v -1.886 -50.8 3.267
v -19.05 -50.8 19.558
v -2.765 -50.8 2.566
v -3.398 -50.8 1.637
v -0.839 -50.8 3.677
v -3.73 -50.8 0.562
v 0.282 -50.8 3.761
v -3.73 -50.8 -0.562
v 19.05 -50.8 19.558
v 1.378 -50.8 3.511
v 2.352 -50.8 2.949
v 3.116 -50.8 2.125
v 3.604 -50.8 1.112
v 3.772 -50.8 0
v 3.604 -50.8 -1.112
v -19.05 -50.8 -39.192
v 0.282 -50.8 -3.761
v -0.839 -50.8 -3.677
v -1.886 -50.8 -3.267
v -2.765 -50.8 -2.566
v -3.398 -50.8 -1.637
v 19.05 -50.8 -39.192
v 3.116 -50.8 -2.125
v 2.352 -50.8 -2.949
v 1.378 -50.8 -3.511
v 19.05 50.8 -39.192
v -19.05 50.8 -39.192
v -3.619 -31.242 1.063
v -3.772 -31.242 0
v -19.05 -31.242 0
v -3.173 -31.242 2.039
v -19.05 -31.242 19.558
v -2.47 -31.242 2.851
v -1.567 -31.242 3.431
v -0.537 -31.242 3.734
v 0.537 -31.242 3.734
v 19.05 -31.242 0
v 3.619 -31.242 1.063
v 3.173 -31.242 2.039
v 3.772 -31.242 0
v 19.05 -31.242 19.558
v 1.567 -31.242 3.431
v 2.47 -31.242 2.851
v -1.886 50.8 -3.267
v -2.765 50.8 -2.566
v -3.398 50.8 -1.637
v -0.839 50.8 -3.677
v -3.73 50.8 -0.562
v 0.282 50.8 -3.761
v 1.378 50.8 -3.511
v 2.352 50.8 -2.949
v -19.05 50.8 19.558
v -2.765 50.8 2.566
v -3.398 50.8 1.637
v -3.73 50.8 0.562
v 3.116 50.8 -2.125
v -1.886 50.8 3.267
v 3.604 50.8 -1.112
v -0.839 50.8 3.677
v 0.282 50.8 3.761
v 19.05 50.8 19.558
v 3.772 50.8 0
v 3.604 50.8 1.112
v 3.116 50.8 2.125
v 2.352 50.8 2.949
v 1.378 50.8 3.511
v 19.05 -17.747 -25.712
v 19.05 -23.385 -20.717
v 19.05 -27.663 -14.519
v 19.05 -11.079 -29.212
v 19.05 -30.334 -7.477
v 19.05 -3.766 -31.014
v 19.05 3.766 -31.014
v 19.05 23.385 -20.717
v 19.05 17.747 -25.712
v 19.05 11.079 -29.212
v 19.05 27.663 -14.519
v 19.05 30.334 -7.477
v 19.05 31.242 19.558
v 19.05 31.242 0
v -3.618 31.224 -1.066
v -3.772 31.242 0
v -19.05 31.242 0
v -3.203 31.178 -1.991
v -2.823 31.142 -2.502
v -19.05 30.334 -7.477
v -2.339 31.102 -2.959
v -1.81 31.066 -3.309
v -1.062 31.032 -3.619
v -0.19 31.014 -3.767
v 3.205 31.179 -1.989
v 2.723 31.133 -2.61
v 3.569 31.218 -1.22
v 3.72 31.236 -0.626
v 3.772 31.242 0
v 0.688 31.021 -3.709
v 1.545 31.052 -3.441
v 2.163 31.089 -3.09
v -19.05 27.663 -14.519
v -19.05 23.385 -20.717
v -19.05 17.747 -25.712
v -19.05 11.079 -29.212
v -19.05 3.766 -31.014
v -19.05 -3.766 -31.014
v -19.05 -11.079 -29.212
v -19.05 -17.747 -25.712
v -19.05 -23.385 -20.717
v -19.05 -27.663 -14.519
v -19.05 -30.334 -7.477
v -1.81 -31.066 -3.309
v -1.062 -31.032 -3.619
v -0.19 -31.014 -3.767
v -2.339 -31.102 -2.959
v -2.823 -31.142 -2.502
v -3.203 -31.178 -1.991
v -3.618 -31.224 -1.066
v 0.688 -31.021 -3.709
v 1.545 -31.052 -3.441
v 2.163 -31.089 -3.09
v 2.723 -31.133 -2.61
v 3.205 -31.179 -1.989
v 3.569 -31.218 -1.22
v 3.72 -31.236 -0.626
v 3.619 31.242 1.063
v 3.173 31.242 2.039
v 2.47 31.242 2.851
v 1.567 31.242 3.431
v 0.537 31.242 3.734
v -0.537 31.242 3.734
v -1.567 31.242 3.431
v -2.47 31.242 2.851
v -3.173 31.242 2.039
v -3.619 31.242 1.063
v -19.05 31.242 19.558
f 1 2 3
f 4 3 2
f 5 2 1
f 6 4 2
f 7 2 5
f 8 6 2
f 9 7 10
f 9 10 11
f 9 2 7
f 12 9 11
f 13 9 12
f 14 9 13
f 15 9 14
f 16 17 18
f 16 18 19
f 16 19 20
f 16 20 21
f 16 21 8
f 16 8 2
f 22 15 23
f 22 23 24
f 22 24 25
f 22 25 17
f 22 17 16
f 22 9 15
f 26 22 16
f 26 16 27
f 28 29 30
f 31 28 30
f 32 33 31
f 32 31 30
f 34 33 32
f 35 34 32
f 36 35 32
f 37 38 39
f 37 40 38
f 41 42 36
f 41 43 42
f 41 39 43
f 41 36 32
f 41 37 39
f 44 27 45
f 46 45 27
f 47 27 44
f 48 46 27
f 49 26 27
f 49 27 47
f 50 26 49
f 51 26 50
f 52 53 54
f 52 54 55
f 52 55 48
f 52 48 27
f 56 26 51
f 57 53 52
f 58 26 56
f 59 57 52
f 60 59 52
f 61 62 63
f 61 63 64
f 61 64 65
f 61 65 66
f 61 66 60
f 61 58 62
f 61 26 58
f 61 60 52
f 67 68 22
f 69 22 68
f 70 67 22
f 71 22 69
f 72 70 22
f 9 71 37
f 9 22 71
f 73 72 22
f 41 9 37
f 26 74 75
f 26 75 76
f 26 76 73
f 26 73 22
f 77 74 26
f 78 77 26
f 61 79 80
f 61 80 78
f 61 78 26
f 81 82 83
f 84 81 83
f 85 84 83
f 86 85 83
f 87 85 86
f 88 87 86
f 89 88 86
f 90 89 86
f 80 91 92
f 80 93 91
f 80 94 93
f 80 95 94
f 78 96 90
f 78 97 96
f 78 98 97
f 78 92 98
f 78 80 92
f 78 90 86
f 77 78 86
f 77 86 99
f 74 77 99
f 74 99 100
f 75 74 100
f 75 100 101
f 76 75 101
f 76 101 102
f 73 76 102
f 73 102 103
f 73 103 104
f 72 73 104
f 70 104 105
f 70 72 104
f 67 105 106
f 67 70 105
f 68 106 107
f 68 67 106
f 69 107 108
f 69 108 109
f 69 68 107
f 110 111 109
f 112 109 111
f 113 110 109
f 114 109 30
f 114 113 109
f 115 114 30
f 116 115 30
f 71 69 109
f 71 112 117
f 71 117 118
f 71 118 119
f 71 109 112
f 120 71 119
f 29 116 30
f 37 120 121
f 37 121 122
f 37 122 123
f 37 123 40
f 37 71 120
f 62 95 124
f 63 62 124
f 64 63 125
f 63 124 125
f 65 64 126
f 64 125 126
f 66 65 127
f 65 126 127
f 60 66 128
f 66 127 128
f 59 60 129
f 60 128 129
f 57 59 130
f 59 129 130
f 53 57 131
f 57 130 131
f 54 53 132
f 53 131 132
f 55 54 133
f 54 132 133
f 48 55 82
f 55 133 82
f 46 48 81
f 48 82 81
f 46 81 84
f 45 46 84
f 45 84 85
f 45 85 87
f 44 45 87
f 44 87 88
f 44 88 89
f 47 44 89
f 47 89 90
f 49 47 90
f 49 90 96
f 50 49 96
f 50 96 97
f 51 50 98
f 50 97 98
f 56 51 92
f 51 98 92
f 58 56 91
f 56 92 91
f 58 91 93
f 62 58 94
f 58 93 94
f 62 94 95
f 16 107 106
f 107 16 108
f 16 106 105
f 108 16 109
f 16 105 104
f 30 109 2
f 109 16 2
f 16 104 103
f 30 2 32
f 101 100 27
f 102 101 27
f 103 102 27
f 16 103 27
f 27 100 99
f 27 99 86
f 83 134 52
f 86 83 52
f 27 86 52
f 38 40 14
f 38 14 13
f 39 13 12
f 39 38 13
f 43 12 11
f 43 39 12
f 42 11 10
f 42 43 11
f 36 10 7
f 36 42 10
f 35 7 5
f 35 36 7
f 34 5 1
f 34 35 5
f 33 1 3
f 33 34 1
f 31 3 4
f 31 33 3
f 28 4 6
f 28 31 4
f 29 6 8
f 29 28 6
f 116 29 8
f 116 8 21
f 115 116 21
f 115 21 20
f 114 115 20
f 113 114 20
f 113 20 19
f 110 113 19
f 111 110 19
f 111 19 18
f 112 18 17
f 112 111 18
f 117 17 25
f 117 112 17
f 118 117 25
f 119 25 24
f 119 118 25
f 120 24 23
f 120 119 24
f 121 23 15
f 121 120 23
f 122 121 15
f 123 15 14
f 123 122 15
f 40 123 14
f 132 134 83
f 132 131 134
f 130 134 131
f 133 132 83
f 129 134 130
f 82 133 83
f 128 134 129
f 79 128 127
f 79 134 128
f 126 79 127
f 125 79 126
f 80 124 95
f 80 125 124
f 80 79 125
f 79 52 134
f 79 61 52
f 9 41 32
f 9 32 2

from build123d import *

# Parameters (mm, degrees)
F1_DEPTH = 19.05
F3_D     = 7.5438
F3_DEPTH = 25.4
F3_TIP   = 2.2663861689


# Not quite as in the source:
# - a pattern or mirror of a feature is missing from the dataset's text; its kind, count and spacing are read off the source's solid


with BuildPart() as f1:
    # F0 (on Right) → F1 (new body, symmetric)
    with BuildSketch(Plane.YZ):
        with BuildLine():
            Line((31.242, 19.558), (31.242, 0))
            ThreePointArc((31.242, 0), (0, -31.242), (-31.242, 0))
            Line((-31.242, 0), (-31.242, 19.558))
            Line((-31.242, 19.558), (-50.8, 19.558))
            Line((-50.8, 19.558), (-50.8, -39.1922))
            Line((-50.8, -39.1922), (0, -39.1922))
            Line((0, -39.1922), (50.8, -39.1922))
            Line((50.8, -39.1922), (50.8, 19.558))
            Line((50.8, 19.558), (31.242, 19.558))
        make_face()
    extrude(amount=F1_DEPTH, both=True)

    # F3
    with Locations(Plane(origin=(0, 50.8, 0), x_dir=(-1, 0, 0), z_dir=(0, 1, 0))):
        with Locations((0, 0)):
            f3 = Hole(F3_D / 2, depth=F3_DEPTH)
            with Locations((0, 0, -(F3_DEPTH + F3_TIP / 2))):  # 118° drill point
                Cone(0, F3_D / 2, F3_TIP, mode=Mode.SUBTRACT)

    # F3_copies: F3 across plane
    add(f3.mirror(Plane(origin=(0, 0, 0), x_dir=(0, 0, -1), z_dir=(0, -1, 0))), mode=Mode.SUBTRACT)


solid = f1.part
